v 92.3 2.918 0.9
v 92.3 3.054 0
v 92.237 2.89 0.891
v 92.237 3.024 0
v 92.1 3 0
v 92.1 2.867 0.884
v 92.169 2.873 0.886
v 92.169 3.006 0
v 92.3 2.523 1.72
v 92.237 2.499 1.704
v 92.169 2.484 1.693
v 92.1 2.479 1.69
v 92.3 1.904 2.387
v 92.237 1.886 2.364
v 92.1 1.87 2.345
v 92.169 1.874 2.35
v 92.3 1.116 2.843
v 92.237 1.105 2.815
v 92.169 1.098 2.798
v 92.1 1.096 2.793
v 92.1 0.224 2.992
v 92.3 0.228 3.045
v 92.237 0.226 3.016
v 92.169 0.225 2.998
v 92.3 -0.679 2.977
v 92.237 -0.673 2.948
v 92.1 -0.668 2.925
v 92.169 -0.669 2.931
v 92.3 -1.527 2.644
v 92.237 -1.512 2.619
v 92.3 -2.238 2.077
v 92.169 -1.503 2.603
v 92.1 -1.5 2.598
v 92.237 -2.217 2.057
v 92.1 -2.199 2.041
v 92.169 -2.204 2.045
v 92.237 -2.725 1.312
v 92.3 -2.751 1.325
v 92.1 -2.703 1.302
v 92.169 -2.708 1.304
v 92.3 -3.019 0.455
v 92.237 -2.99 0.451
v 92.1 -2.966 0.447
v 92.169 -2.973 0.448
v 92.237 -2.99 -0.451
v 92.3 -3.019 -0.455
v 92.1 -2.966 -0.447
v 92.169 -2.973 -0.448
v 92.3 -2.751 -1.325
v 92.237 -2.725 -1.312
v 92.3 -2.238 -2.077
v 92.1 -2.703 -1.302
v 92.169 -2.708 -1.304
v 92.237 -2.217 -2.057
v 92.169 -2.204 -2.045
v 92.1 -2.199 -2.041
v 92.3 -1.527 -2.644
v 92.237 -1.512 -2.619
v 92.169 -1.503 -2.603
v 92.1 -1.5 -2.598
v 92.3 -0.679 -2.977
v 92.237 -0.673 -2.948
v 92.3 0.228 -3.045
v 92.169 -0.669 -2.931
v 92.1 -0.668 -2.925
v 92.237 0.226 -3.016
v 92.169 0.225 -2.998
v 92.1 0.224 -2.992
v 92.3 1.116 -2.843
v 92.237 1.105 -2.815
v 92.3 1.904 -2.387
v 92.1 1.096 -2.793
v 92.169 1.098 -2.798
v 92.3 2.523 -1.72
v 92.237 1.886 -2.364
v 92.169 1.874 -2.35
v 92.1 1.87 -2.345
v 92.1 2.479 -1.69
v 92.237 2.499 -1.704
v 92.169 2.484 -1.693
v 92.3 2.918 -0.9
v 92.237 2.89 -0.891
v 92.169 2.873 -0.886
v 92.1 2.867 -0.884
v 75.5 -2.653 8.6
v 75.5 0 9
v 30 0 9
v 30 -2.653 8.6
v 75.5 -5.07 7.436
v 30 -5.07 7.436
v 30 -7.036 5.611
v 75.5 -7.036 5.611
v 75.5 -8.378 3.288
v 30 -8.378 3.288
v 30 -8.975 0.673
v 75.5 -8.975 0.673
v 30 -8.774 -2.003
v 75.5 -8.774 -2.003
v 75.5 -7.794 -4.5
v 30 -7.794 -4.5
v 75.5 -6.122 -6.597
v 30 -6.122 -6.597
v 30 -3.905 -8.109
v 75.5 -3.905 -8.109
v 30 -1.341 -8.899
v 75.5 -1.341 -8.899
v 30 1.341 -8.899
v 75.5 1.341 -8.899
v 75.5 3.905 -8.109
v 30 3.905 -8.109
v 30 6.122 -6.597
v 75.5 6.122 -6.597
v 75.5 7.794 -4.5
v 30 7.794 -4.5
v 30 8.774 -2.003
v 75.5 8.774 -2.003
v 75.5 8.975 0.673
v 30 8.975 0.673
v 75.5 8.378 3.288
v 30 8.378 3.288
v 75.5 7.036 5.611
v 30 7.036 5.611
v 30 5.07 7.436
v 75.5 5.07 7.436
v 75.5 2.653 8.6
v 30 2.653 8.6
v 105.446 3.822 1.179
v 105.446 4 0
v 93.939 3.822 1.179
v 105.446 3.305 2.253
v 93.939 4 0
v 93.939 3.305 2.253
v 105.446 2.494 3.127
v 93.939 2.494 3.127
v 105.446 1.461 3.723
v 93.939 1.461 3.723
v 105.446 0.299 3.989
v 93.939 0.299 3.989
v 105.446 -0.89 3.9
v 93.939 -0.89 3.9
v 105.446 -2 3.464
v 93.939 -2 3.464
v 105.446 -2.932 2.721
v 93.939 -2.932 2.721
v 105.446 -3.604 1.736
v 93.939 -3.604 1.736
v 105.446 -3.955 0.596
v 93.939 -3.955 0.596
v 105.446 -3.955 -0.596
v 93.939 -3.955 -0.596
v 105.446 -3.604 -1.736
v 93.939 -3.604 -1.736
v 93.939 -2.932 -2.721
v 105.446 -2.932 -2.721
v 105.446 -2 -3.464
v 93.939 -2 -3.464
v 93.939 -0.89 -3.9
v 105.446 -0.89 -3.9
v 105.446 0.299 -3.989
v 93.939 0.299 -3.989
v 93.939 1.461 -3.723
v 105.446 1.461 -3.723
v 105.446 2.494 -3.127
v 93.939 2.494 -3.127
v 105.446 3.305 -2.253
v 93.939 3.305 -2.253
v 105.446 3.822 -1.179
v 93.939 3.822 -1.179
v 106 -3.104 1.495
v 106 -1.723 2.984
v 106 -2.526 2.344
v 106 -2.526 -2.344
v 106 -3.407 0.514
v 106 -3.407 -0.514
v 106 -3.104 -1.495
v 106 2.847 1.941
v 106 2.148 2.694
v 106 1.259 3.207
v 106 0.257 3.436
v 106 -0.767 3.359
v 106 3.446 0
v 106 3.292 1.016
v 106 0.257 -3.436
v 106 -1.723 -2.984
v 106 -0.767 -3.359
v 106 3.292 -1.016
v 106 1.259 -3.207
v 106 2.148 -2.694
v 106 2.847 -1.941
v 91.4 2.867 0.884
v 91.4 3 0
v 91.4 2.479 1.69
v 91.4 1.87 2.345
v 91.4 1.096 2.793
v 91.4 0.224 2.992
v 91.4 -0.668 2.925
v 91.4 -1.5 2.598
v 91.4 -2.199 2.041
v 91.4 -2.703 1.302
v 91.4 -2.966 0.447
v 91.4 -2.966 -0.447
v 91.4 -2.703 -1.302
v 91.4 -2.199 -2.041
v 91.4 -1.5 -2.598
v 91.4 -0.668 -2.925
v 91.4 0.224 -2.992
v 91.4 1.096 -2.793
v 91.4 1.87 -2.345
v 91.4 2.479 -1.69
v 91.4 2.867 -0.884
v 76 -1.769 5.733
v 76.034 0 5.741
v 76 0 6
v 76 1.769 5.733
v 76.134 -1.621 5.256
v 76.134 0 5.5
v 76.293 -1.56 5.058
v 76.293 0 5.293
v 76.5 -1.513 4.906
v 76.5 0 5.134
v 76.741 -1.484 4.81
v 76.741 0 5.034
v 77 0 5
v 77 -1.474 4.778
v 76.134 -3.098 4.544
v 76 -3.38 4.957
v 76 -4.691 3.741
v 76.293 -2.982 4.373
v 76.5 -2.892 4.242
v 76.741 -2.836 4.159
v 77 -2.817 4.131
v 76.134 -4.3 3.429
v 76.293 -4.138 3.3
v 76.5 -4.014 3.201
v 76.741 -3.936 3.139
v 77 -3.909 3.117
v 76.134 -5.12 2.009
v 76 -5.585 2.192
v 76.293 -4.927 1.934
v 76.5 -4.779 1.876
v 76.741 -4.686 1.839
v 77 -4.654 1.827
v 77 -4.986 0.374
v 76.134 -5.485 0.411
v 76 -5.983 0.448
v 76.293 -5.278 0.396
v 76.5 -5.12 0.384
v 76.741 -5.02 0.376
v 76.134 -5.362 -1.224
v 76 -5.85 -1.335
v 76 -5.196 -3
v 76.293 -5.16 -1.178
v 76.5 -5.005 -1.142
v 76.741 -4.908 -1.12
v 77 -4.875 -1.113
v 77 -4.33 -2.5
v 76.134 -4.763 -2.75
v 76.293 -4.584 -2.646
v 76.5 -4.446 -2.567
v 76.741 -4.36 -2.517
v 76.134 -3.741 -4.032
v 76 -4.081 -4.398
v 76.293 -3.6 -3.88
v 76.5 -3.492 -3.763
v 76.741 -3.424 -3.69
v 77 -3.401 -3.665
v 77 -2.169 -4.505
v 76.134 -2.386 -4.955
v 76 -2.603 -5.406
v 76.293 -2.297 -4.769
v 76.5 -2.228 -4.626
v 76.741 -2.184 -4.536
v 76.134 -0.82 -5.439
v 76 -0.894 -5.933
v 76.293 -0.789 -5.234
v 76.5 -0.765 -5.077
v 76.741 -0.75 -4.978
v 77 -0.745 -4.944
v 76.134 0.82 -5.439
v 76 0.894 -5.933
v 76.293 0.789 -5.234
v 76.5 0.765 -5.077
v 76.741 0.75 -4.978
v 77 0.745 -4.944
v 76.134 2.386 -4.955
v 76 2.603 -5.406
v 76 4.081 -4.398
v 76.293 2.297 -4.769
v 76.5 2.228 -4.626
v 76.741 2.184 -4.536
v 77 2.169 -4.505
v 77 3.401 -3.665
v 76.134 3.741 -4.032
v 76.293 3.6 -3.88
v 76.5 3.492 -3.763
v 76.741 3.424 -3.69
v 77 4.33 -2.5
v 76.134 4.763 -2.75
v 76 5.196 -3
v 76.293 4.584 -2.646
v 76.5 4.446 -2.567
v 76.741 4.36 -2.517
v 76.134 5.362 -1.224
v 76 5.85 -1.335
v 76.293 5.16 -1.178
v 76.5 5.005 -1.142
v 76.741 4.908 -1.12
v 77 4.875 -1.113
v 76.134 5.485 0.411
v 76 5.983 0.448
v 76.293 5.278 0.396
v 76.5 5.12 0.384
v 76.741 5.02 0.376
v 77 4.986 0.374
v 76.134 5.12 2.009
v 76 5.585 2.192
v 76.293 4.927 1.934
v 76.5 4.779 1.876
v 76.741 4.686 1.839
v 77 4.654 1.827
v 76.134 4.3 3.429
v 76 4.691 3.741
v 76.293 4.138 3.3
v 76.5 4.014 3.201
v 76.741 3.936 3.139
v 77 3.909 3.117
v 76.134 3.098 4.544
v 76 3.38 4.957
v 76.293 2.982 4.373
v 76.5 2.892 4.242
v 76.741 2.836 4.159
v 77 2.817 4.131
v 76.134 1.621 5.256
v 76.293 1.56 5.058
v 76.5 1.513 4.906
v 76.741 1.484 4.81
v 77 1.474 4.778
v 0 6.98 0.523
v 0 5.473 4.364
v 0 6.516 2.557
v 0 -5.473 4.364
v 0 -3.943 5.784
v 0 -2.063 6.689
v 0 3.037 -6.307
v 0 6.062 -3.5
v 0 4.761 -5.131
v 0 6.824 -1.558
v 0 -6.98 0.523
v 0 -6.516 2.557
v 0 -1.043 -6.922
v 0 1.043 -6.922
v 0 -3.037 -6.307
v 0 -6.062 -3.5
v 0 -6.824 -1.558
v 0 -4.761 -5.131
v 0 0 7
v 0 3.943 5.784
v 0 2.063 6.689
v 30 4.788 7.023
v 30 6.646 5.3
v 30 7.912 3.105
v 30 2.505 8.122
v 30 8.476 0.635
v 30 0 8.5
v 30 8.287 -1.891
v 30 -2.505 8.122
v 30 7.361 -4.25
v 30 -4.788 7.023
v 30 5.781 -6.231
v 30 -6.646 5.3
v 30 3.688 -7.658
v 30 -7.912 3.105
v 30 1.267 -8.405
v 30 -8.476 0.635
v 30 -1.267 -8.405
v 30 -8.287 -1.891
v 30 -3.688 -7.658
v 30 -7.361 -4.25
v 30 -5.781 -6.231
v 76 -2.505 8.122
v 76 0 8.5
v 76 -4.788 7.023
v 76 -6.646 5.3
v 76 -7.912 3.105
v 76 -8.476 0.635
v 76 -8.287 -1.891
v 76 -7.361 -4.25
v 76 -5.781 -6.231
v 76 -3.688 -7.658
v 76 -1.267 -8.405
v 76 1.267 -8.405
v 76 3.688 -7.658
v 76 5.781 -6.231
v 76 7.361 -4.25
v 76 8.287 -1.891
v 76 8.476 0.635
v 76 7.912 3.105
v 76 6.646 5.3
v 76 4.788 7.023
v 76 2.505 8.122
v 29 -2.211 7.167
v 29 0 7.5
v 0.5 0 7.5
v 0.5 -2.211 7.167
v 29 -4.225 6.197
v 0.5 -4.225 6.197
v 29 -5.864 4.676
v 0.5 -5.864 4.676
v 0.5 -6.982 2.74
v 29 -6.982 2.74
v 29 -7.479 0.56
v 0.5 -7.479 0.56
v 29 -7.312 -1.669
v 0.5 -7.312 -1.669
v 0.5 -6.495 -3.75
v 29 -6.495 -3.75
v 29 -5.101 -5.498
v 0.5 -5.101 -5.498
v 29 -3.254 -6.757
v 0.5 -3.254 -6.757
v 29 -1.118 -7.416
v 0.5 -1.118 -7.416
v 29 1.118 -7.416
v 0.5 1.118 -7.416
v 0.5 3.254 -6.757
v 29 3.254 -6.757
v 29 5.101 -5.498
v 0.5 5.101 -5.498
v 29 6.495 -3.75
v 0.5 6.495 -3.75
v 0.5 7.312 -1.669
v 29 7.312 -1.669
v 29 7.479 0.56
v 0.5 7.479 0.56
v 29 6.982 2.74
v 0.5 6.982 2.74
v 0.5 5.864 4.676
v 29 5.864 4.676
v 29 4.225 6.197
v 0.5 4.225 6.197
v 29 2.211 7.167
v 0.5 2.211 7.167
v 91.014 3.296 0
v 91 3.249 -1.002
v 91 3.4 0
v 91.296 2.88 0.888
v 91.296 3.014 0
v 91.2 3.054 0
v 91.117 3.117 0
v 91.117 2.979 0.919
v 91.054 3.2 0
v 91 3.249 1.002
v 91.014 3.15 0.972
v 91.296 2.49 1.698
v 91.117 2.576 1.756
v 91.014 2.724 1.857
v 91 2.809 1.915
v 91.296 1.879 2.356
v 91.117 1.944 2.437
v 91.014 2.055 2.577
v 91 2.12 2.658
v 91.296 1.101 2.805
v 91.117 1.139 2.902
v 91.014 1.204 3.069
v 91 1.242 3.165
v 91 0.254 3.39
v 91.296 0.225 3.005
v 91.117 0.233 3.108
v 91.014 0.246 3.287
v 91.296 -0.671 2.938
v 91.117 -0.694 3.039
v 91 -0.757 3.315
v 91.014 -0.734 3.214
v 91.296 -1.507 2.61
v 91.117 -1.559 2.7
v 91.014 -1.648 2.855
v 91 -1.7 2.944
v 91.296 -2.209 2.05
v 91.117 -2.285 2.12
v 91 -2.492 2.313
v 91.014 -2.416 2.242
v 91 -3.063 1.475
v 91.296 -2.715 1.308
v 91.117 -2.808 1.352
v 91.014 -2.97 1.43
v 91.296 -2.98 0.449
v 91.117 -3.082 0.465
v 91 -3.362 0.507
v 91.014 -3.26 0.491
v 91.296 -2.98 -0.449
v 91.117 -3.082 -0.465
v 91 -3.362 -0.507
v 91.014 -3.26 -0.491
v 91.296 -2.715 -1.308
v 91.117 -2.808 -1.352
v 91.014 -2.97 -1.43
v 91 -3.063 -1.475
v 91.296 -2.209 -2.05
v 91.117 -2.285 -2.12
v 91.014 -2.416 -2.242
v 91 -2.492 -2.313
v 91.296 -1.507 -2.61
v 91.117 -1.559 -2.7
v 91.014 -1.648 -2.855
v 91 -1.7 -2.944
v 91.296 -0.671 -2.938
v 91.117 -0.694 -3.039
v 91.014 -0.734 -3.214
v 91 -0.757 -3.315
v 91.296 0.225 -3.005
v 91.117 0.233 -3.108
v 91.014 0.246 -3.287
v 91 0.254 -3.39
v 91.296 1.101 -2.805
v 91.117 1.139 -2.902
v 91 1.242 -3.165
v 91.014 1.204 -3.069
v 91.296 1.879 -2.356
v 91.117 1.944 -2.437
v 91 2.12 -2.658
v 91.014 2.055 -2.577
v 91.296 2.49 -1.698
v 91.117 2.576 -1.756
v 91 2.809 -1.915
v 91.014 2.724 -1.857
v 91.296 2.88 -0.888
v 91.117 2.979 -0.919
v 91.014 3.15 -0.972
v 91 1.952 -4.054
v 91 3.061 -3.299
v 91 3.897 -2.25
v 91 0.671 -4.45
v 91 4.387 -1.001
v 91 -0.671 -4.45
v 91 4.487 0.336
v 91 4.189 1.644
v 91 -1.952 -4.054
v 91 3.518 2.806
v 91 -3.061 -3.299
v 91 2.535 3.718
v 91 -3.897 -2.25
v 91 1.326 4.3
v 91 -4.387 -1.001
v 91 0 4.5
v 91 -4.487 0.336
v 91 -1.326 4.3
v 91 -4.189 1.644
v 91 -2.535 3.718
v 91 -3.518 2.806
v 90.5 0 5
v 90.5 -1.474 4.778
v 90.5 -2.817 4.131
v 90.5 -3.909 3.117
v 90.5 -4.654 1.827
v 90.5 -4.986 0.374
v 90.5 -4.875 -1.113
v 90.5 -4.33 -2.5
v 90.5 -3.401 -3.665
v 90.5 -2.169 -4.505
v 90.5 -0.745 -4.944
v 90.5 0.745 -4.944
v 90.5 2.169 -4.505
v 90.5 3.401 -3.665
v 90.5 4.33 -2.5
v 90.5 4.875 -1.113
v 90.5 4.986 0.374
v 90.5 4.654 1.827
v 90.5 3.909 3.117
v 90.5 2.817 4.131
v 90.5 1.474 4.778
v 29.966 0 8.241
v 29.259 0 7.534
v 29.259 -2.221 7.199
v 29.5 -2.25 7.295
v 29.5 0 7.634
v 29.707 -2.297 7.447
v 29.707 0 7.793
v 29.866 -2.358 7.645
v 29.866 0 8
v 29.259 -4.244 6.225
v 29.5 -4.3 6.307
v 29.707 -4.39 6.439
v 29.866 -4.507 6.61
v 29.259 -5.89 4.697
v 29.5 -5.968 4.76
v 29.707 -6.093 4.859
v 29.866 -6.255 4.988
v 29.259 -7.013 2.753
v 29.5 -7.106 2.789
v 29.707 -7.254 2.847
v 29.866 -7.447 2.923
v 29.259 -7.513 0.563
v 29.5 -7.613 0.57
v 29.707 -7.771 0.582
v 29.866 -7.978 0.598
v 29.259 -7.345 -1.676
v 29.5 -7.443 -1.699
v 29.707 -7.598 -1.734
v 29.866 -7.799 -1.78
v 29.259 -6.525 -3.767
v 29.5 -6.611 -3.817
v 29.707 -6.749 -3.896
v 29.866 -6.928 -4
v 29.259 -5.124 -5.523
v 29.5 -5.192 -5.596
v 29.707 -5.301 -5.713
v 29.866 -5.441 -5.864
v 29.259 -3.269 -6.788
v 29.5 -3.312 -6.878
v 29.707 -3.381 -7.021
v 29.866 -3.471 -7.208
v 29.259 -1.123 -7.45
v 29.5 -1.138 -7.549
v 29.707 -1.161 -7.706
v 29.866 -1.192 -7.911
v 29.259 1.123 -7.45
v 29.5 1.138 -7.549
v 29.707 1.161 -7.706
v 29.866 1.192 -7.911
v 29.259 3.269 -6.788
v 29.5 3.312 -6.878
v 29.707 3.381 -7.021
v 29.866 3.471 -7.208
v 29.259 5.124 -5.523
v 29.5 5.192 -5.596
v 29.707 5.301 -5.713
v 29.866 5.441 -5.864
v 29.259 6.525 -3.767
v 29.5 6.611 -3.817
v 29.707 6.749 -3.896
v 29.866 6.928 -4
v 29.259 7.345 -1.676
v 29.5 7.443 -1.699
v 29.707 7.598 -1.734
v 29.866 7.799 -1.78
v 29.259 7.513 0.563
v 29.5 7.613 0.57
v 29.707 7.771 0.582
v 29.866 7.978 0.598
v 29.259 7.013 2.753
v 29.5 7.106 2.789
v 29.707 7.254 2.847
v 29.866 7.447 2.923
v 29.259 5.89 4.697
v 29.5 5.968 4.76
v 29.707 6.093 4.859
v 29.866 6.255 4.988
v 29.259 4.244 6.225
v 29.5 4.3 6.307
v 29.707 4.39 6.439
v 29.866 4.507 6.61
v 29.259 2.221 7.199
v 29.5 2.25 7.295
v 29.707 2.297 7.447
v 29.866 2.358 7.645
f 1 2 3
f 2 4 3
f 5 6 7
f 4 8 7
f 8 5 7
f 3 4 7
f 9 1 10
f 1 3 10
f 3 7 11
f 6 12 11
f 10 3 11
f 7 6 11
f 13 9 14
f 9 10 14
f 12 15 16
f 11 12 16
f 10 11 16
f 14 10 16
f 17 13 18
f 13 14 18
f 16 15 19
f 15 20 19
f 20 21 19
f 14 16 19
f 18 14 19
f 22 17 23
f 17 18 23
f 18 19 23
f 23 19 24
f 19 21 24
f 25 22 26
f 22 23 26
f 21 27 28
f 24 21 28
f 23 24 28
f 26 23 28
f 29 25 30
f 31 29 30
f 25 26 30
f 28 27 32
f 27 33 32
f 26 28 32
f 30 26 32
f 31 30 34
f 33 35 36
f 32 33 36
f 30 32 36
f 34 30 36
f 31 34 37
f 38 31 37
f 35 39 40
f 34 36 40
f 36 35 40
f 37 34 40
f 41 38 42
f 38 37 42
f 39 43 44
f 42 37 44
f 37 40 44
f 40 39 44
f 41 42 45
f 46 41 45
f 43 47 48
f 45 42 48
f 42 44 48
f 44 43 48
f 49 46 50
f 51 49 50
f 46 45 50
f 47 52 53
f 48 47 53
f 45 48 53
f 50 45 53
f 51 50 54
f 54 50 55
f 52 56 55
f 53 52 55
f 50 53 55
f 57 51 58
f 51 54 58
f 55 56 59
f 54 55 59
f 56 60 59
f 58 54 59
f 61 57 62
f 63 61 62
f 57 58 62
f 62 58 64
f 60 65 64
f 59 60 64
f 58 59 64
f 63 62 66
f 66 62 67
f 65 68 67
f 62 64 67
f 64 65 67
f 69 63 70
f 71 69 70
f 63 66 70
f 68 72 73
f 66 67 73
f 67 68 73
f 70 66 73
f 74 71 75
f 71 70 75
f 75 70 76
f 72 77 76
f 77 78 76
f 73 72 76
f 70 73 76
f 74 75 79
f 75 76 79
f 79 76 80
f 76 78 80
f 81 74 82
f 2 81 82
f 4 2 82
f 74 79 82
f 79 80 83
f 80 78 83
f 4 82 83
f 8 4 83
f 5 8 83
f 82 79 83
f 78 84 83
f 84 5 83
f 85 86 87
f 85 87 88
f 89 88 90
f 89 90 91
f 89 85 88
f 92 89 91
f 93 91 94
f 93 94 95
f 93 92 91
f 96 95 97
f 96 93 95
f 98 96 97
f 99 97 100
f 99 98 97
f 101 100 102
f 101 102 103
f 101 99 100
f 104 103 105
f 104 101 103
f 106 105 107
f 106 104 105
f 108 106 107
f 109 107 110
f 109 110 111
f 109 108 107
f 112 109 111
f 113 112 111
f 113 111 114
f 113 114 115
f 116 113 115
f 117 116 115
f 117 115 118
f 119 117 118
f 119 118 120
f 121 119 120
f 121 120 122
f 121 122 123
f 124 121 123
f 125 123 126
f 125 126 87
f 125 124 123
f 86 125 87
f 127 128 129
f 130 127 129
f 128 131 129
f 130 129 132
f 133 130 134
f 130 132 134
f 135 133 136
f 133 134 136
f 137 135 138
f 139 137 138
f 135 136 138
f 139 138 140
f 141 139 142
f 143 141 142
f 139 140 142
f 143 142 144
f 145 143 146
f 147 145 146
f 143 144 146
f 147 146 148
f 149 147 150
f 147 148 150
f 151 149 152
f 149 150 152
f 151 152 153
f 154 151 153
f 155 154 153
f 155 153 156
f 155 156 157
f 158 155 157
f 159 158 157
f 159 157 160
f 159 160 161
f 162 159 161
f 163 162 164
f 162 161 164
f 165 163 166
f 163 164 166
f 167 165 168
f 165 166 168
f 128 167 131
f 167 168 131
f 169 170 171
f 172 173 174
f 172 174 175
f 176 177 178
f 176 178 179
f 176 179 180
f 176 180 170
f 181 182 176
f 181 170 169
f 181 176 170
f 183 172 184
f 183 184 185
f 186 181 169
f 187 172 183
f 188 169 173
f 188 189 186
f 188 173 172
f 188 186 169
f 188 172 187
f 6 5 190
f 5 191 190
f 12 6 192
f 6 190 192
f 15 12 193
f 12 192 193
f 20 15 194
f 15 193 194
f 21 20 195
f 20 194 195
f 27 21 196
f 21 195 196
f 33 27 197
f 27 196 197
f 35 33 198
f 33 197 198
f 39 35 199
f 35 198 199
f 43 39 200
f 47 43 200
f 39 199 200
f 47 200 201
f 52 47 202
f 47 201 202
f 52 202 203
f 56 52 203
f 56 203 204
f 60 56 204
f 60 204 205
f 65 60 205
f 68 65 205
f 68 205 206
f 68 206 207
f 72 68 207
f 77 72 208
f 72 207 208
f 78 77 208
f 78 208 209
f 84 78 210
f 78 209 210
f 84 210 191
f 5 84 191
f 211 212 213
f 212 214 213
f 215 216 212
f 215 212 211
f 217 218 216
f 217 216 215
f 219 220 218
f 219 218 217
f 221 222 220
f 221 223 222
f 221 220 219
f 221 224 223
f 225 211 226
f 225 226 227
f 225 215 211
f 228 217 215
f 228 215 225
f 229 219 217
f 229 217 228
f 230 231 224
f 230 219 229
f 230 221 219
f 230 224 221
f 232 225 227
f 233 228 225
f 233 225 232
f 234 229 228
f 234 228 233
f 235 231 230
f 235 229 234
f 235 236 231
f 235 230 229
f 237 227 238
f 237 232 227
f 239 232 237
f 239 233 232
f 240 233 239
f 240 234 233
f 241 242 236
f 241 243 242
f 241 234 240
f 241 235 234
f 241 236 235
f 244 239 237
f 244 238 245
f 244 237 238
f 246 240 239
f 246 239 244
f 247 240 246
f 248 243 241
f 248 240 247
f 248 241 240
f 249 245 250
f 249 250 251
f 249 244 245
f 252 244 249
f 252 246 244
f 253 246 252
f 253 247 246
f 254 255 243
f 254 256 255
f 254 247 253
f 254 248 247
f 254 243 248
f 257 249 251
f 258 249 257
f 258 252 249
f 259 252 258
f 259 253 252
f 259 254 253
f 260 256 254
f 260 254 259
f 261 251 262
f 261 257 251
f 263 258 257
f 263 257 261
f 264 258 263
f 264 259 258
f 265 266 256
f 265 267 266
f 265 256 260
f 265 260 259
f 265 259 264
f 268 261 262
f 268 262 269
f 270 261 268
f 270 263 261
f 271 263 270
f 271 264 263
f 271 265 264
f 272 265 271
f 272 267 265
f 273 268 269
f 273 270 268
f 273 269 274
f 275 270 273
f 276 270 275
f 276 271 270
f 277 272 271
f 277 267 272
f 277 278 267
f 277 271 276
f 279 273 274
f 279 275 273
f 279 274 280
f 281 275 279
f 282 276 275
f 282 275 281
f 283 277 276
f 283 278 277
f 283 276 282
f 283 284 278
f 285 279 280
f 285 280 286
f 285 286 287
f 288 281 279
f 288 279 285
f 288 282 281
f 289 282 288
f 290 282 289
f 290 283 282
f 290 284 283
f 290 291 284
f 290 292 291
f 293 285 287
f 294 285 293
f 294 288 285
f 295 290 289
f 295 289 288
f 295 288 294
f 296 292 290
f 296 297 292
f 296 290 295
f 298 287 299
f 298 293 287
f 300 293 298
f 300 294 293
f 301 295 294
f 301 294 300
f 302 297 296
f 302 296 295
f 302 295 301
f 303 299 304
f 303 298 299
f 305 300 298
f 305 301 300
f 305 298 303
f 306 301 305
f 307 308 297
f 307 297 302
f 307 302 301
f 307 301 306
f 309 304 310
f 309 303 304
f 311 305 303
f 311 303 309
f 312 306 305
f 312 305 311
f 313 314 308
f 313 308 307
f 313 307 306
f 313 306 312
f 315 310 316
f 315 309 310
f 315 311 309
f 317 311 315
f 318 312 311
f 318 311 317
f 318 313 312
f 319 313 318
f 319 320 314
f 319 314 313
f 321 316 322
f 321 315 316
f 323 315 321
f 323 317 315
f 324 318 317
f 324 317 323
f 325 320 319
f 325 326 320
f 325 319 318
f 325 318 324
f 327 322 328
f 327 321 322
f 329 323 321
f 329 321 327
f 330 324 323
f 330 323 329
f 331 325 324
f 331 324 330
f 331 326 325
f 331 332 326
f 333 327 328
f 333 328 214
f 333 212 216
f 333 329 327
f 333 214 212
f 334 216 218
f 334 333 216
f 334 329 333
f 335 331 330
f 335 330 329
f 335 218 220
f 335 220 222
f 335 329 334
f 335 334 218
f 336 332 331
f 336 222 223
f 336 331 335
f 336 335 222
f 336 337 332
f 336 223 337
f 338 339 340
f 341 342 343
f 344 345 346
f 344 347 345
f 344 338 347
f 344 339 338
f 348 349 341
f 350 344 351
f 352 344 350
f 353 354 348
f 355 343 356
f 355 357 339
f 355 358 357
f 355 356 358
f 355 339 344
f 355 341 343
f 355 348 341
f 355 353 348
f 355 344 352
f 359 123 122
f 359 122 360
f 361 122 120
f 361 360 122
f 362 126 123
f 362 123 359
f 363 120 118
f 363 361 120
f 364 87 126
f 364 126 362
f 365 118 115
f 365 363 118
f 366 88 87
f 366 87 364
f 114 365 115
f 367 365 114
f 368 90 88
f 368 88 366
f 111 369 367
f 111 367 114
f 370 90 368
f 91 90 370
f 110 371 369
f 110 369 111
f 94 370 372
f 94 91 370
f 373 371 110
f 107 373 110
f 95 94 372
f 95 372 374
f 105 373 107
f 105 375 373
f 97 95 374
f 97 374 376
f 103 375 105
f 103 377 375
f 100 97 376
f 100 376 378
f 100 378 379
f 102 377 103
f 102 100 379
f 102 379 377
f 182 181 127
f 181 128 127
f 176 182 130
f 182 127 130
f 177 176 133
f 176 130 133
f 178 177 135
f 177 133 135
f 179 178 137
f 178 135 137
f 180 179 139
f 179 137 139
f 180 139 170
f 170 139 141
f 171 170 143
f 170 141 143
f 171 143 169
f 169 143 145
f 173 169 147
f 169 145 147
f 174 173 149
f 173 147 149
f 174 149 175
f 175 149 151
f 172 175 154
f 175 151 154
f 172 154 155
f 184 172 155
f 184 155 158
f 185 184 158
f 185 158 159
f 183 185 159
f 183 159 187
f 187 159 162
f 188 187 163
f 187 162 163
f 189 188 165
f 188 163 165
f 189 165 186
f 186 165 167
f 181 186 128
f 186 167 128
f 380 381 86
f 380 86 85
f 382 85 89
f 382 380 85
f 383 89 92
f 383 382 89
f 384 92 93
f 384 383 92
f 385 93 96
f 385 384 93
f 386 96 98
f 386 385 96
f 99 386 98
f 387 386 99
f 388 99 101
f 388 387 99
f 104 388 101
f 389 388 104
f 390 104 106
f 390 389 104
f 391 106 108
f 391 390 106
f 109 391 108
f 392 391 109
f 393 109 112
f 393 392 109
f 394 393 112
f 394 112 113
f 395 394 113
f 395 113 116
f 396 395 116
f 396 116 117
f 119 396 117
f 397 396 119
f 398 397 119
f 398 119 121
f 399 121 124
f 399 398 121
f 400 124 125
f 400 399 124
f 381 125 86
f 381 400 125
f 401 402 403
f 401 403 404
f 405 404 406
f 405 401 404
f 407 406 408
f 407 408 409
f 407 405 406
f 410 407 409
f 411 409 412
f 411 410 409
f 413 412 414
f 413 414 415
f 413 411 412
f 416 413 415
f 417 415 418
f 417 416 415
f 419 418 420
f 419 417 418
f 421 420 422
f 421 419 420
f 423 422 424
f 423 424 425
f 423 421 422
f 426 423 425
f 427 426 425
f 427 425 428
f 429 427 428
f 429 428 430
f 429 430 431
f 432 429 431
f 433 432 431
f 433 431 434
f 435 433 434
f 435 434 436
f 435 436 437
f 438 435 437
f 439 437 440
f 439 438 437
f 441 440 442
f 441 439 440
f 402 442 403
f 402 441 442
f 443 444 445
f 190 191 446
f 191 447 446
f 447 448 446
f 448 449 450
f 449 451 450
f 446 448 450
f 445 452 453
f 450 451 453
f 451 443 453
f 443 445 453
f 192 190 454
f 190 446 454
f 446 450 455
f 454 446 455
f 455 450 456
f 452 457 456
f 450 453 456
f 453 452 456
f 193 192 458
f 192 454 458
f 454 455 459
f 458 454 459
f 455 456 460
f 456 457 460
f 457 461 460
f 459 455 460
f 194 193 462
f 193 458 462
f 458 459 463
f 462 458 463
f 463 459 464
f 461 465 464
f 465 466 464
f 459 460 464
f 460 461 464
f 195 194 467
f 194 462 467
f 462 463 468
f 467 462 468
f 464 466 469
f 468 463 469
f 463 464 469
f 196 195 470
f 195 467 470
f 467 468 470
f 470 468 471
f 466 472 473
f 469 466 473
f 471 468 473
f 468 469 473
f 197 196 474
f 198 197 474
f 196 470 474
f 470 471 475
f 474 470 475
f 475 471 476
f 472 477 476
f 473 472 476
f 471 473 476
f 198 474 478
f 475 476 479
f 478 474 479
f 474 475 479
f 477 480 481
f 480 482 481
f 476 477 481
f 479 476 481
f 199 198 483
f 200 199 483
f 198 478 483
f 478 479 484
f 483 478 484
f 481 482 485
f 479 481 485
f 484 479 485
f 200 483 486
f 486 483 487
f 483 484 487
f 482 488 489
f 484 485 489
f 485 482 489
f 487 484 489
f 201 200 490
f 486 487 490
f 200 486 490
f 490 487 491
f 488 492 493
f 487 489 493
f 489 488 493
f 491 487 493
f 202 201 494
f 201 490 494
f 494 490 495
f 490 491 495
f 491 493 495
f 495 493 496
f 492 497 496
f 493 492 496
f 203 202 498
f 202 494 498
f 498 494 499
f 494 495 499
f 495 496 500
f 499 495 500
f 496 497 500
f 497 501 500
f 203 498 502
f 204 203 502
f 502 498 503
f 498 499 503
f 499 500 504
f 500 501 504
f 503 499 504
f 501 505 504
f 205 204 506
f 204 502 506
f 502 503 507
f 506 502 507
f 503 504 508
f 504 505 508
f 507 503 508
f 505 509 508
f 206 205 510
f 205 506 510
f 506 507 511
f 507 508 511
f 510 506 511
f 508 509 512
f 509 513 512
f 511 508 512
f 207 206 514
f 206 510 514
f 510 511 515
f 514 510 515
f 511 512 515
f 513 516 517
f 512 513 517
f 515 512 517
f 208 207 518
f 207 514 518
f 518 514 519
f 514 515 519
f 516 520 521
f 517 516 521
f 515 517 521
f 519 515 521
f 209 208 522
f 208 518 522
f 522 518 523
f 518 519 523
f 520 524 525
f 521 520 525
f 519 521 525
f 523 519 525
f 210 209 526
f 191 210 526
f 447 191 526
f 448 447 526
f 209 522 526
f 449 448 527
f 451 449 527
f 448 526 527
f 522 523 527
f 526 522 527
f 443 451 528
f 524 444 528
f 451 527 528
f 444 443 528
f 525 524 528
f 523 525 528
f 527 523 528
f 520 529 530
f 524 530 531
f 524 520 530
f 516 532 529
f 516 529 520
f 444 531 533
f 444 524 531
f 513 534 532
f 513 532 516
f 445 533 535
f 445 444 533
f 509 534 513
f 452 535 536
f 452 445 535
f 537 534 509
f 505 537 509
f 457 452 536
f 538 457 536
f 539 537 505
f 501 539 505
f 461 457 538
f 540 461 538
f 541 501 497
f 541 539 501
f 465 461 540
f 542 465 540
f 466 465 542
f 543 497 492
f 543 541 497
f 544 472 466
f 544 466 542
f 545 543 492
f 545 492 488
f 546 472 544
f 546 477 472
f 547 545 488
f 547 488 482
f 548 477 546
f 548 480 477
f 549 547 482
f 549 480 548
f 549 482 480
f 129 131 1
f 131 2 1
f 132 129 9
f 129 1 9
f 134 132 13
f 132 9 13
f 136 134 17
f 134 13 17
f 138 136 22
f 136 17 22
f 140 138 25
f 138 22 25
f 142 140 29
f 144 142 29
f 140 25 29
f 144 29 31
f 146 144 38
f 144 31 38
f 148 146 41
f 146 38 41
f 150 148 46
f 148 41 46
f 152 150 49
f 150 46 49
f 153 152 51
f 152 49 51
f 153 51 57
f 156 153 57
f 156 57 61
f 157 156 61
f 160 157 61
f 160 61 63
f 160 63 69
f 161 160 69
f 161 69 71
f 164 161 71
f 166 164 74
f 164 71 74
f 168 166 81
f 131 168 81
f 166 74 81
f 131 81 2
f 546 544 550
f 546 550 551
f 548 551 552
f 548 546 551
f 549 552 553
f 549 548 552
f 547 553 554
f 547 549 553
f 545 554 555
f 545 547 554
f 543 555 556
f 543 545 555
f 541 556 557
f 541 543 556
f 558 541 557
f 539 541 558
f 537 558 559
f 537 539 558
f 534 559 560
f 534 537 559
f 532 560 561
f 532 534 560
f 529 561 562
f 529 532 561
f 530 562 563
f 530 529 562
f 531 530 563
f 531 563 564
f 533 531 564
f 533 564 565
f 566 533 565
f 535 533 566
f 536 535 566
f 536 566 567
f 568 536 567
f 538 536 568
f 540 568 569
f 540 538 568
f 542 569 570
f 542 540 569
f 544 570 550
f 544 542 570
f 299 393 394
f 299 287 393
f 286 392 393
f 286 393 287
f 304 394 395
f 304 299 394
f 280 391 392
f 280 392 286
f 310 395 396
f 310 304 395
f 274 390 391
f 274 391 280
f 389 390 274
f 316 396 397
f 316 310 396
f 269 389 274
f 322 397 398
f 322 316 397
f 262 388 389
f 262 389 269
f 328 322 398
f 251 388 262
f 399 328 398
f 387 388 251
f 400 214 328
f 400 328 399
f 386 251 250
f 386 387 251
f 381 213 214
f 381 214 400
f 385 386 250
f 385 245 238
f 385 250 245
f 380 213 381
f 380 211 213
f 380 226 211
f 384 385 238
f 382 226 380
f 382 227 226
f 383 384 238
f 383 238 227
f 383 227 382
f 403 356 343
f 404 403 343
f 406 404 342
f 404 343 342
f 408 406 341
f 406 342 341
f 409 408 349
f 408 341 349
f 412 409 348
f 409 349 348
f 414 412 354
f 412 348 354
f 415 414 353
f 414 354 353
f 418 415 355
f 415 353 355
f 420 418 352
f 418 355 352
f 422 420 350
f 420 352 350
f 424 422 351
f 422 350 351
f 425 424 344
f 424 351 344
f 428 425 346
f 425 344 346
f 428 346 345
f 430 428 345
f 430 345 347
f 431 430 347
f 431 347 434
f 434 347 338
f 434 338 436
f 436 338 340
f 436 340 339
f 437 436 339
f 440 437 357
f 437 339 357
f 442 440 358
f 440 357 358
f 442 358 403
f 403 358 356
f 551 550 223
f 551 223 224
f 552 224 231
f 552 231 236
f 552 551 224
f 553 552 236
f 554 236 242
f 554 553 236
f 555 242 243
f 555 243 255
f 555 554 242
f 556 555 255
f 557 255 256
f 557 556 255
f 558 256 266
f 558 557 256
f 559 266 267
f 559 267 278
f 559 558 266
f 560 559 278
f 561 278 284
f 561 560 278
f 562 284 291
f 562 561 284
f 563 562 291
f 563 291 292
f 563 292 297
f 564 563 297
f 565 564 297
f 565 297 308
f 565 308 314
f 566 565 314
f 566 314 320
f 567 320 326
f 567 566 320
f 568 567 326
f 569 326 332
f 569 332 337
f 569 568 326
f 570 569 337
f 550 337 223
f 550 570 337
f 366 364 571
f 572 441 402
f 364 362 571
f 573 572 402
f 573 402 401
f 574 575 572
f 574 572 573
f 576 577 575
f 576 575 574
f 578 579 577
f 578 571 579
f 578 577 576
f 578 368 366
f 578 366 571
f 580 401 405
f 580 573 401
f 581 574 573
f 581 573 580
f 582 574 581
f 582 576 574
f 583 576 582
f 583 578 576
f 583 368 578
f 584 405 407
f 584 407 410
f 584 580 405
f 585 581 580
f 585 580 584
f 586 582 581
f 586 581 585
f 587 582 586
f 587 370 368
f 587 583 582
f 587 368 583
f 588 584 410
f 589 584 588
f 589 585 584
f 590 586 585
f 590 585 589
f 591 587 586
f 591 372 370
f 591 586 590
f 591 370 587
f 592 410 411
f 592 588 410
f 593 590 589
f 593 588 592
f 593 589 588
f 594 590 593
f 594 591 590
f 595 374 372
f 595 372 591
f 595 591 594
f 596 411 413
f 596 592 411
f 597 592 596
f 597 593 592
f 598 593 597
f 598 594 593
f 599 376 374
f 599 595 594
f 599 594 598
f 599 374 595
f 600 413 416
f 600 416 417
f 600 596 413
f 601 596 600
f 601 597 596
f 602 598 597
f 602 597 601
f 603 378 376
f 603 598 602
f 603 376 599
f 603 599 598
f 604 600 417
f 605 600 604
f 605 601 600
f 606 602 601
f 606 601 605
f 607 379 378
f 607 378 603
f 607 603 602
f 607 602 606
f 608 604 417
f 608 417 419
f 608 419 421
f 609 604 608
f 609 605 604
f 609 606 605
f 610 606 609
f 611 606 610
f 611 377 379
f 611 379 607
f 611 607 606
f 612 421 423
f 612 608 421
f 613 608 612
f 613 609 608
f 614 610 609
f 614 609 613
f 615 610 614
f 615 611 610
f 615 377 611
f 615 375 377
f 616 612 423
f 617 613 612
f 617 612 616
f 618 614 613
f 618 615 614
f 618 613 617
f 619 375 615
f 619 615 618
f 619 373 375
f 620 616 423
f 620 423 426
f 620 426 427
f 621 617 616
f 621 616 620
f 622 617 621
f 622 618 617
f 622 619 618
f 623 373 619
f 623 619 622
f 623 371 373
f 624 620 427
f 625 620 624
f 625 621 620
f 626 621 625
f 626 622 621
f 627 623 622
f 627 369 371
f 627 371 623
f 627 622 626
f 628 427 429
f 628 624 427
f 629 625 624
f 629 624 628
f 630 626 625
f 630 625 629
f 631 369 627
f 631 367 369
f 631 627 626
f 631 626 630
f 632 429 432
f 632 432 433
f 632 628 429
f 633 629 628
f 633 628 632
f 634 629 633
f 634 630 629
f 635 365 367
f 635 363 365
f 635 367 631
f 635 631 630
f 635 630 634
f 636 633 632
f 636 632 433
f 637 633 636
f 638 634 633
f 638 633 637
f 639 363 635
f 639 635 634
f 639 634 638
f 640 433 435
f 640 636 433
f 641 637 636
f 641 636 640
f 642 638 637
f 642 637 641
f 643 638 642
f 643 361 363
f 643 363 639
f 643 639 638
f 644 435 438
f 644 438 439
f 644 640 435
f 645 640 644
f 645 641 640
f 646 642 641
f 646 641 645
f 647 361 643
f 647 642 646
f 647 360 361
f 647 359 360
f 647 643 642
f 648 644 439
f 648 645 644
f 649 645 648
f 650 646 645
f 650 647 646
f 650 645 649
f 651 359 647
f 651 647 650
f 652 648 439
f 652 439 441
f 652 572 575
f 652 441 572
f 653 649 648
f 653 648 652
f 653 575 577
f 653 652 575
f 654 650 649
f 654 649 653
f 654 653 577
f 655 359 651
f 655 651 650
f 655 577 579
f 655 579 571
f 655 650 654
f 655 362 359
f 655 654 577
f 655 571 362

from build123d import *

# Parameters (mm, degrees)
FILLET1_R           = 1
CHAMFER1_SIZE       = 0.5
CHAMFER2_SIZE       = 0.5
SKETCH2_R           = 4.1
BOSS_EXTRUDE1_DEPTH = 15


# Read off the part's stored shape, not the designer's step: M8x1.0 Machine Threads Stud1
with BuildPart() as part:
    # Sketch1 → Revolve1 (revolve)
    with BuildSketch(Plane.XY, mode=Mode.PRIVATE) as revolve1_sk:
        Polygon((0, 0), (0, -7.5), (30, -7.5), (30, -9), (76, -9), (76, -5), (91, -5), (91, 0), align=None)
    revolve(revolve1_sk.sketch.rotate(Axis((0, 0, 0), (1, 0, 0)), 270), axis=Axis((0, 0, 0), (1, 0, 0)))

    # Fillet1
    fillet1_edges = [part.edges().sort_by_distance(p)[0] for p in [
        (76, 0, -5),
        (30, 0, -7.5),
    ]]
    fillet(fillet1_edges, radius=FILLET1_R)

    # Chamfer1
    chamfer1_edges = [part.edges().sort_by_distance(p)[0] for p in [
        (0, 0, -7.5),
    ]]
    chamfer(chamfer1_edges, length=CHAMFER1_SIZE)

    # Chamfer2
    chamfer2_edges = [part.edges().sort_by_distance(p)[0] for p in [
        (91, 0, -5),
        (76, 0, -9),
    ]]
    chamfer(chamfer2_edges, length=CHAMFER2_SIZE)

    # Sketch2 → Boss-Extrude1 (add)
    with BuildSketch(Plane(origin=(91, 0, 0), x_dir=(0, 0, -1), z_dir=(1, 0, 0))):
        Circle(SKETCH2_R)
    extrude(amount=BOSS_EXTRUDE1_DEPTH)

    # M8x1.0 Machine Threads Stud1 outline → M8x1.0 Machine Threads Stud1 (revolve, cut)
    with BuildSketch(Plane.YX):
        with BuildLine():
            ThreePointArc((3, 91.4), (3.117157288, 91.117157288), (3.4, 91))
            Line((3.4, 91), (4.1, 91))
            Line((4.1, 91), (4.1, 106))
            Line((4.1, 106), (3.4455, 106))
            Line((3.4455, 106), (4, 105.4455))
            Line((4, 105.4455), (4, 93.939230485))
            Line((4, 93.939230485), (3.053589838, 92.3))
            ThreePointArc((3.053589838, 92.3), (3.013629669, 92.203527618), (3, 92.1))
            Line((3, 92.1), (3, 91.4))
        make_face()
    revolve(axis=Axis((0, 0, 0), (1, 0, 0)), mode=Mode.SUBTRACT)


solid = part.part
